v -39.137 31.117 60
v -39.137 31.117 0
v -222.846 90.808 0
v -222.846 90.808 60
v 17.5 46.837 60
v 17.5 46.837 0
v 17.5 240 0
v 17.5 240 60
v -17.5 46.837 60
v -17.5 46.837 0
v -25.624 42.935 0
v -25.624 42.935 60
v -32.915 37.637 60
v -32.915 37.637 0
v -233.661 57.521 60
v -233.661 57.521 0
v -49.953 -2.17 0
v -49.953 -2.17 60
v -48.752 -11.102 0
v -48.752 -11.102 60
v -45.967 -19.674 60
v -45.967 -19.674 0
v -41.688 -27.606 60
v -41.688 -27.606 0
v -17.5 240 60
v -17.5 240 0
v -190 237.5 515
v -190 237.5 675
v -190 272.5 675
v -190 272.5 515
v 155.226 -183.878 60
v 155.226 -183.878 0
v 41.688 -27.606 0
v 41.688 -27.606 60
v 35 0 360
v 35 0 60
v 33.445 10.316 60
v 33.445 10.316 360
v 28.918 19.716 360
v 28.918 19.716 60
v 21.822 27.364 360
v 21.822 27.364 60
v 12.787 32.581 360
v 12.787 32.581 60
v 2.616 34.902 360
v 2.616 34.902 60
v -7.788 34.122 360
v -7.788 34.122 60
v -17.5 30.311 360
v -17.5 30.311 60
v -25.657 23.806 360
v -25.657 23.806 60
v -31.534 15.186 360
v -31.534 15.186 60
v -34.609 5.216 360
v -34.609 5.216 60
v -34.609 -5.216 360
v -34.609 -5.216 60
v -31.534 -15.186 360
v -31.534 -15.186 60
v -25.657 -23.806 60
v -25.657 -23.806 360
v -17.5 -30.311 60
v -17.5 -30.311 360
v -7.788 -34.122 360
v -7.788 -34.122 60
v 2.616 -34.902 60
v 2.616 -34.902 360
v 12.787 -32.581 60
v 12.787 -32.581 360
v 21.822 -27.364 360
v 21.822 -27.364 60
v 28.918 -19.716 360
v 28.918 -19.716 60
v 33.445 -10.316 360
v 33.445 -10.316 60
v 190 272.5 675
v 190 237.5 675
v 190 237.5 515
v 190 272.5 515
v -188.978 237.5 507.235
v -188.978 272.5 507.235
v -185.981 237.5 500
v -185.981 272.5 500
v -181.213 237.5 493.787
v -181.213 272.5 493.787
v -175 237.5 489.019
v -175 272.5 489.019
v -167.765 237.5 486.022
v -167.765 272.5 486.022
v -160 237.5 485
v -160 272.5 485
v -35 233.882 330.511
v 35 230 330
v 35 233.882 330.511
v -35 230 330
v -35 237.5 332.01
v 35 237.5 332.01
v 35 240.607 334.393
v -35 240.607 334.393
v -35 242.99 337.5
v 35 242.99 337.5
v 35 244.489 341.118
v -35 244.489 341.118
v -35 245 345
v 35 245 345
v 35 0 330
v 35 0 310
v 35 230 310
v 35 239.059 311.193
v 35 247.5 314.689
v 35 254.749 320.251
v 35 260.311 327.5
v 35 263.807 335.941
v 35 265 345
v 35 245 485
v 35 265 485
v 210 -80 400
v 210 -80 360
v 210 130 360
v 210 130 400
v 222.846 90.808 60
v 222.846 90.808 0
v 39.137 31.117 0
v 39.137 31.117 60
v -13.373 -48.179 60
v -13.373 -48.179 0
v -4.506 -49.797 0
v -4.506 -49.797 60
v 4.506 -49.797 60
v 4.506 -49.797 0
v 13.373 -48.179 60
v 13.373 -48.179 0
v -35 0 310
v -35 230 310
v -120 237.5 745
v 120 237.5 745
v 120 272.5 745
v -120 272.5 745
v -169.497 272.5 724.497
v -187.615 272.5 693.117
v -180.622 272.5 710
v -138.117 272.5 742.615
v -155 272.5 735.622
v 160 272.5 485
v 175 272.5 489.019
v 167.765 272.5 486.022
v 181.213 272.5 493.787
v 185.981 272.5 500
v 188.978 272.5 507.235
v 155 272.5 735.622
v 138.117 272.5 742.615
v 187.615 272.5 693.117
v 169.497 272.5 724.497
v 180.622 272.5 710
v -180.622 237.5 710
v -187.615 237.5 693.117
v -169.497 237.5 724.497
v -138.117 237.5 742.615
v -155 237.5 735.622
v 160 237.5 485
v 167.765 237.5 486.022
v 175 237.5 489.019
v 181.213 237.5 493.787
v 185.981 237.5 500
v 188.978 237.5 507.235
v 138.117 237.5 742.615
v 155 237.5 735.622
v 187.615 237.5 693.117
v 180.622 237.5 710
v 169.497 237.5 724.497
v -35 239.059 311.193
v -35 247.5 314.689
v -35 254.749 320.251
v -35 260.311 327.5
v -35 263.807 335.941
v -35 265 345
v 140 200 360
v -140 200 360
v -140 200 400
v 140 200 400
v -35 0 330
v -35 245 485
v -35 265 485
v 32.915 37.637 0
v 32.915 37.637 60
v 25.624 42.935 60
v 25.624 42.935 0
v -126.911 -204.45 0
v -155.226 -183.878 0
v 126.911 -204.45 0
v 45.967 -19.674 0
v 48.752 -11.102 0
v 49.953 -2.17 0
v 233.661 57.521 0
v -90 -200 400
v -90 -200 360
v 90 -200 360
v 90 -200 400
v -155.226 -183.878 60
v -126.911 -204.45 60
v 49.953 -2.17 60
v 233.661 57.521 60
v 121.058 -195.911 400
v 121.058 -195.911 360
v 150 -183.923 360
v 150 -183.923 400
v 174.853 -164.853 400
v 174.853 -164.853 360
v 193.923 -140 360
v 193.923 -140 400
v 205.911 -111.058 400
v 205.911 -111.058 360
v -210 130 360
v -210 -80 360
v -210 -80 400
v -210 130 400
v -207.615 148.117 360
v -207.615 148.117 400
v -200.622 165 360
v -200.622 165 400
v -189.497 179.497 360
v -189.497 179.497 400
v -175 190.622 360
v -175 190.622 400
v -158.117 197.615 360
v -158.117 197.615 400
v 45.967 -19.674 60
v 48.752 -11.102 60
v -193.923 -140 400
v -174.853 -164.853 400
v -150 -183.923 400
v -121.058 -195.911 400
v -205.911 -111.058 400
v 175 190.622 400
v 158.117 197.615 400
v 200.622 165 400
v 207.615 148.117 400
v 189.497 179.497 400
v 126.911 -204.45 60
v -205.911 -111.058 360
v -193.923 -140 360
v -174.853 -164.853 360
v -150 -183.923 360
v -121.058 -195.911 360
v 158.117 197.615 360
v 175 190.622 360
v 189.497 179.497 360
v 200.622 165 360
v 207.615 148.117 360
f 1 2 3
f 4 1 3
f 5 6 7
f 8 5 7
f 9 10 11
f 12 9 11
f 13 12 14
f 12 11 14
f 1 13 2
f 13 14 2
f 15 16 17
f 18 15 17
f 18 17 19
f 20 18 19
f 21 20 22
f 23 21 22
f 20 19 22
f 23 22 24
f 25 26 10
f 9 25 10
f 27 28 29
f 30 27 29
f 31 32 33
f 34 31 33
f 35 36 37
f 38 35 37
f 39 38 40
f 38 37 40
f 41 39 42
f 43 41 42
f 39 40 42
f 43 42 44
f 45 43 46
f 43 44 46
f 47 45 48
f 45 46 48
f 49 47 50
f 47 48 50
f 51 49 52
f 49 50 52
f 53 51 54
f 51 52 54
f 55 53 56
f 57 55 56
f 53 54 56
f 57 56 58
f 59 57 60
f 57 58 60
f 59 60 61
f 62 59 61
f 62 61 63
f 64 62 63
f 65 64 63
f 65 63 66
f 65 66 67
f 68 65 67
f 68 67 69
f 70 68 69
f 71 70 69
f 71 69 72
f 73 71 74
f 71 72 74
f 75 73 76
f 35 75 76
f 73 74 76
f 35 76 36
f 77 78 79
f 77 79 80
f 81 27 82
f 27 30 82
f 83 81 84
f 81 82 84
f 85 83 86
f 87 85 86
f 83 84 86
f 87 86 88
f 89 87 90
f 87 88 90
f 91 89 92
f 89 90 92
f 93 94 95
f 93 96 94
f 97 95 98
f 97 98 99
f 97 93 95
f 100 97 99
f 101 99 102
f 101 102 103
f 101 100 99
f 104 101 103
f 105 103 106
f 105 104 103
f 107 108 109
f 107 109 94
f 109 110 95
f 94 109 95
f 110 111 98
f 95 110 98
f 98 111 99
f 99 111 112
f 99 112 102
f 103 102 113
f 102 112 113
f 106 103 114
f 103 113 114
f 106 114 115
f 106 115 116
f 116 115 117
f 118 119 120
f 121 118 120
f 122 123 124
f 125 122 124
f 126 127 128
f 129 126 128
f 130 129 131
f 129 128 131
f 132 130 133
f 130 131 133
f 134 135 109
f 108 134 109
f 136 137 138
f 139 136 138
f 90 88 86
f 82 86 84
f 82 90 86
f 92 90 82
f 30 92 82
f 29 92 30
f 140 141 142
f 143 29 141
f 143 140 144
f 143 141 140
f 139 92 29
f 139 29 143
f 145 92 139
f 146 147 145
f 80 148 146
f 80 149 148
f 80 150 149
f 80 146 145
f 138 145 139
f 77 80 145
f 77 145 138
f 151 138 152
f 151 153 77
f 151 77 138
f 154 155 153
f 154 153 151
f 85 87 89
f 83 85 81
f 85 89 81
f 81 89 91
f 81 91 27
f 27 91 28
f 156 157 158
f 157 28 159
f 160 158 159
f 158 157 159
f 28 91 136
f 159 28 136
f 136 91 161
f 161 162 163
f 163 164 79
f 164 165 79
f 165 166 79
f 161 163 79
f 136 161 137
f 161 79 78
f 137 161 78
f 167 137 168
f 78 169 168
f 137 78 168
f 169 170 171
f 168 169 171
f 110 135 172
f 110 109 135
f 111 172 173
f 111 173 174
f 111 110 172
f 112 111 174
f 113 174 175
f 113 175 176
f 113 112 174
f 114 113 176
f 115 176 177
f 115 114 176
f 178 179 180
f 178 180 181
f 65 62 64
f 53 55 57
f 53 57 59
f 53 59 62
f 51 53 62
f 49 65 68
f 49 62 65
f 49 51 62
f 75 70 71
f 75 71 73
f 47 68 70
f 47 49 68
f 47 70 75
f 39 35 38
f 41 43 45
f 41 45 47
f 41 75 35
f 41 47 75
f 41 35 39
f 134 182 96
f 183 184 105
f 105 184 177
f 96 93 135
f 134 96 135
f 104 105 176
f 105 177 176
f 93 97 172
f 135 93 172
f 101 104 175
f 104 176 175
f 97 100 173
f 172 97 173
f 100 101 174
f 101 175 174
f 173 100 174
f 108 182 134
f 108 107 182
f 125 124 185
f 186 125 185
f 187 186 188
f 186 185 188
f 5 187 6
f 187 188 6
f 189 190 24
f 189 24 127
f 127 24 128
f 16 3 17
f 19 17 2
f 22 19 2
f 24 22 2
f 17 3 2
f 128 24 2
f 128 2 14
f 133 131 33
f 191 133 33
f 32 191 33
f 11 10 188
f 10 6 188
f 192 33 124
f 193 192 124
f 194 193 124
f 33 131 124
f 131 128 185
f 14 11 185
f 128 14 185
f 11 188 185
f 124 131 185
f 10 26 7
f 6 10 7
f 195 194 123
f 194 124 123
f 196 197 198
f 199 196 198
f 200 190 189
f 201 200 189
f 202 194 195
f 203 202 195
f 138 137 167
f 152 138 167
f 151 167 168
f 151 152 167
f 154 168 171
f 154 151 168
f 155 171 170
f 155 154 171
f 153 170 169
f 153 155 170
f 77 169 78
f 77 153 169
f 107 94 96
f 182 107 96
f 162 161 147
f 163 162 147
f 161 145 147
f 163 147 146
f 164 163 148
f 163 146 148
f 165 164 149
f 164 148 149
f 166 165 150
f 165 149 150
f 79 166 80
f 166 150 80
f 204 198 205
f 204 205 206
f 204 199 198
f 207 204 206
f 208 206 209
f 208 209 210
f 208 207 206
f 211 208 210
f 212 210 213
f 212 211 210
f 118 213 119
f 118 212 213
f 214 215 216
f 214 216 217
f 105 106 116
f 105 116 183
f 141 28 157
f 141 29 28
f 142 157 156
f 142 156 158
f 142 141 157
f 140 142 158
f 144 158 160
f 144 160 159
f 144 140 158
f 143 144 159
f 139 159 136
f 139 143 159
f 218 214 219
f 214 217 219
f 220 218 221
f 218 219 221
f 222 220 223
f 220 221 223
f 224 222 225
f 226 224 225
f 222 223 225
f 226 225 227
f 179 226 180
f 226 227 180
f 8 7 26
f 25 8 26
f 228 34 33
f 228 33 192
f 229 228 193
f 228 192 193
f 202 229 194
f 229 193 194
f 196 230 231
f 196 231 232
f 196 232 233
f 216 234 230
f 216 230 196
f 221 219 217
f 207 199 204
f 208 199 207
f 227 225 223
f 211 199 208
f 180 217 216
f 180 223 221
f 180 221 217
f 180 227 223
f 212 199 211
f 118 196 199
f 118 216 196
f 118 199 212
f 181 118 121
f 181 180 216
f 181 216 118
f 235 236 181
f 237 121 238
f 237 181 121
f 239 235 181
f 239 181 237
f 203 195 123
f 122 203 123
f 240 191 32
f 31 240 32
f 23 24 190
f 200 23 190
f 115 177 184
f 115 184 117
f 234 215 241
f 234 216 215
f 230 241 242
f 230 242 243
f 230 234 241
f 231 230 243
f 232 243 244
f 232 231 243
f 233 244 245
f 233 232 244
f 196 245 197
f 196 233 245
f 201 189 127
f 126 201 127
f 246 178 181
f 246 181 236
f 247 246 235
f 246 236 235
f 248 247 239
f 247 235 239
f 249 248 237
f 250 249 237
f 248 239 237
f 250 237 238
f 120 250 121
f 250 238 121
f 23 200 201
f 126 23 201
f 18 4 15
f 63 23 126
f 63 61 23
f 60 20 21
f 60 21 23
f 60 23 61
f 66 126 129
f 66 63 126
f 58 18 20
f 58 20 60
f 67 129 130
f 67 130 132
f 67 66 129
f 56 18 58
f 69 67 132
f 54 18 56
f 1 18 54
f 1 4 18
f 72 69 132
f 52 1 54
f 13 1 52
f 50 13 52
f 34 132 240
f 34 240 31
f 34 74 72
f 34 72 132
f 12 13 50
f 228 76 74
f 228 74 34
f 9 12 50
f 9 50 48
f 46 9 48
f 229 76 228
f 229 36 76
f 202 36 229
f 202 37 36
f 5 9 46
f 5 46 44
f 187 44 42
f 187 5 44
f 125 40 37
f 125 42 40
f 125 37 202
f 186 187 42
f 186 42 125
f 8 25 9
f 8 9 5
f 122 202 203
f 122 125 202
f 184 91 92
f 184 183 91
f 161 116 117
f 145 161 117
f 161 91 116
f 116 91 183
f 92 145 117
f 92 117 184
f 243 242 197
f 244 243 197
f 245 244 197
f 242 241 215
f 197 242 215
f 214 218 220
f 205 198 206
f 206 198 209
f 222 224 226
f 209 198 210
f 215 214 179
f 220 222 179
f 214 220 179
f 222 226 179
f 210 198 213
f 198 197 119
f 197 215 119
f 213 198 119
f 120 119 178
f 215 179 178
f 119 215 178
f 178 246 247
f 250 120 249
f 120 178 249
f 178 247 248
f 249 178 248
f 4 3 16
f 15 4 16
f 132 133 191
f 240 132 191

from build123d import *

# Parameters (mm, degrees)
F1_DEPTH  = 60
F2_R      = 35
F3_DEPTH  = 300
F4_W      = 420
F4_H      = 400
F5_DEPTH  = 40
F6_R      = 120
F7_R      = 70
F8_W      = 70
F8_H      = 20
F11_W     = 35
F11_H     = 260
F12_DEPTH = 190
F13_R     = 70
F14_R     = 30


with BuildPart() as f1:
    # F0 (on Top) → F1 (new body)
    with BuildSketch(Plane.XY):
        with BuildLine():
            Line((-233.6613613124, 57.5205896148), (-49.9528927063, -2.1699102001))
            ThreePointArc((-49.9528927063, -2.1699102001), (-47.5528258148, -15.4508497187), (-41.688180332, -27.6060794139))
            Line((-41.688180332, -27.6060794139), (-155.2262579518, -183.8778367349))
            Line((-155.2262579518, -183.8778367349), (-126.9106631486, -204.4503205651))
            Line((-126.9106631486, -204.4503205651), (-13.3725855288, -48.1785632442))
            ThreePointArc((-13.3725855288, -48.1785632442), (0, -50), (13.3725855288, -48.1785632442))
            Line((13.3725855288, -48.1785632442), (126.9106631486, -204.4503205651))
            Line((126.9106631486, -204.4503205651), (155.2262579518, -183.8778367349))
            Line((155.2262579518, -183.8778367349), (41.688180332, -27.6060794139))
            ThreePointArc((41.688180332, -27.6060794139), (47.5528258148, -15.4508497187), (49.9528927063, -2.1699102001))
            Line((49.9528927063, -2.1699102001), (233.6613613124, 57.5205896148))
            Line((233.6613613124, 57.5205896148), (222.8457665093, 90.8075676852))
            Line((222.8457665093, 90.8075676852), (39.1372979031, 31.1170678702))
            ThreePointArc((39.1372979031, 31.1170678702), (29.3892626146, 40.4508497187), (17.5, 46.837484988))
            Line((17.5, 46.837484988), (17.5, 240))
            Line((17.5, 240), (-17.5, 240))
            Line((-17.5, 240), (-17.5, 46.837484988))
            ThreePointArc((-17.5, 46.837484988), (-29.3892626146, 40.4508497187), (-39.1372979031, 31.1170678702))
            Line((-39.1372979031, 31.1170678702), (-222.8457665093, 90.8075676852))
            Line((-222.8457665093, 90.8075676852), (-233.6613613124, 57.5205896148))
        make_face()
    extrude(amount=F1_DEPTH)

    # F2 (on face) → F3 (join)
    with BuildSketch(Plane.XY.offset(60)):
        Circle(F2_R)
    extrude(amount=F3_DEPTH)


with BuildPart() as f5:
    # F4 (on face) → F5 (new body)
    with BuildSketch(Plane.XY.offset(360)):
        Rectangle(F4_W, F4_H)
    extrude(amount=F5_DEPTH)

    # F6
    f6_edges = [f5.edges().sort_by_distance(p)[0] for p in [
        (210, -200, 380),
        (-210, -200, 380),
    ]]
    fillet(f6_edges, radius=F6_R)

    # F7
    f7_edges = [f5.edges().sort_by_distance(p)[0] for p in [
        (210, 200, 380),
        (-210, 200, 380),
    ]]
    fillet(f7_edges, radius=F7_R)


with BuildPart() as f10:
    # F10: sweep along a path in F9
    with BuildLine(Plane.YZ) as f10_path:
        Line((0, 315), (230, 315))
        ThreePointArc((230, 315), (251.2132034356, 323.7867965644), (260, 345))
        Line((260, 345), (260, 485))
    # F8 (on Front) → F10 (sweep)
    with BuildSketch(Plane.XZ):
        with Locations((0, 320)):
            Rectangle(F8_W, F8_H)
    sweep(path=f10_path.line)

    # F11 (on Right) → F12 (join, symmetric)
    with BuildSketch(Plane.YZ):
        with Locations((255, 615)):
            Rectangle(F11_W, F11_H)
    extrude(amount=F12_DEPTH, both=True)

    # F13
    f13_edges = [f10.edges().sort_by_distance(p)[0] for p in [
        (190, 255, 745),
        (-190, 255, 745),
    ]]
    fillet(f13_edges, radius=F13_R)

    # F14
    f14_edges = [f10.edges().sort_by_distance(p)[0] for p in [
        (-190, 255, 485),
        (190, 255, 485),
    ]]
    fillet(f14_edges, radius=F14_R)


solid = Compound([f1.part, f5.part, f10.part])
